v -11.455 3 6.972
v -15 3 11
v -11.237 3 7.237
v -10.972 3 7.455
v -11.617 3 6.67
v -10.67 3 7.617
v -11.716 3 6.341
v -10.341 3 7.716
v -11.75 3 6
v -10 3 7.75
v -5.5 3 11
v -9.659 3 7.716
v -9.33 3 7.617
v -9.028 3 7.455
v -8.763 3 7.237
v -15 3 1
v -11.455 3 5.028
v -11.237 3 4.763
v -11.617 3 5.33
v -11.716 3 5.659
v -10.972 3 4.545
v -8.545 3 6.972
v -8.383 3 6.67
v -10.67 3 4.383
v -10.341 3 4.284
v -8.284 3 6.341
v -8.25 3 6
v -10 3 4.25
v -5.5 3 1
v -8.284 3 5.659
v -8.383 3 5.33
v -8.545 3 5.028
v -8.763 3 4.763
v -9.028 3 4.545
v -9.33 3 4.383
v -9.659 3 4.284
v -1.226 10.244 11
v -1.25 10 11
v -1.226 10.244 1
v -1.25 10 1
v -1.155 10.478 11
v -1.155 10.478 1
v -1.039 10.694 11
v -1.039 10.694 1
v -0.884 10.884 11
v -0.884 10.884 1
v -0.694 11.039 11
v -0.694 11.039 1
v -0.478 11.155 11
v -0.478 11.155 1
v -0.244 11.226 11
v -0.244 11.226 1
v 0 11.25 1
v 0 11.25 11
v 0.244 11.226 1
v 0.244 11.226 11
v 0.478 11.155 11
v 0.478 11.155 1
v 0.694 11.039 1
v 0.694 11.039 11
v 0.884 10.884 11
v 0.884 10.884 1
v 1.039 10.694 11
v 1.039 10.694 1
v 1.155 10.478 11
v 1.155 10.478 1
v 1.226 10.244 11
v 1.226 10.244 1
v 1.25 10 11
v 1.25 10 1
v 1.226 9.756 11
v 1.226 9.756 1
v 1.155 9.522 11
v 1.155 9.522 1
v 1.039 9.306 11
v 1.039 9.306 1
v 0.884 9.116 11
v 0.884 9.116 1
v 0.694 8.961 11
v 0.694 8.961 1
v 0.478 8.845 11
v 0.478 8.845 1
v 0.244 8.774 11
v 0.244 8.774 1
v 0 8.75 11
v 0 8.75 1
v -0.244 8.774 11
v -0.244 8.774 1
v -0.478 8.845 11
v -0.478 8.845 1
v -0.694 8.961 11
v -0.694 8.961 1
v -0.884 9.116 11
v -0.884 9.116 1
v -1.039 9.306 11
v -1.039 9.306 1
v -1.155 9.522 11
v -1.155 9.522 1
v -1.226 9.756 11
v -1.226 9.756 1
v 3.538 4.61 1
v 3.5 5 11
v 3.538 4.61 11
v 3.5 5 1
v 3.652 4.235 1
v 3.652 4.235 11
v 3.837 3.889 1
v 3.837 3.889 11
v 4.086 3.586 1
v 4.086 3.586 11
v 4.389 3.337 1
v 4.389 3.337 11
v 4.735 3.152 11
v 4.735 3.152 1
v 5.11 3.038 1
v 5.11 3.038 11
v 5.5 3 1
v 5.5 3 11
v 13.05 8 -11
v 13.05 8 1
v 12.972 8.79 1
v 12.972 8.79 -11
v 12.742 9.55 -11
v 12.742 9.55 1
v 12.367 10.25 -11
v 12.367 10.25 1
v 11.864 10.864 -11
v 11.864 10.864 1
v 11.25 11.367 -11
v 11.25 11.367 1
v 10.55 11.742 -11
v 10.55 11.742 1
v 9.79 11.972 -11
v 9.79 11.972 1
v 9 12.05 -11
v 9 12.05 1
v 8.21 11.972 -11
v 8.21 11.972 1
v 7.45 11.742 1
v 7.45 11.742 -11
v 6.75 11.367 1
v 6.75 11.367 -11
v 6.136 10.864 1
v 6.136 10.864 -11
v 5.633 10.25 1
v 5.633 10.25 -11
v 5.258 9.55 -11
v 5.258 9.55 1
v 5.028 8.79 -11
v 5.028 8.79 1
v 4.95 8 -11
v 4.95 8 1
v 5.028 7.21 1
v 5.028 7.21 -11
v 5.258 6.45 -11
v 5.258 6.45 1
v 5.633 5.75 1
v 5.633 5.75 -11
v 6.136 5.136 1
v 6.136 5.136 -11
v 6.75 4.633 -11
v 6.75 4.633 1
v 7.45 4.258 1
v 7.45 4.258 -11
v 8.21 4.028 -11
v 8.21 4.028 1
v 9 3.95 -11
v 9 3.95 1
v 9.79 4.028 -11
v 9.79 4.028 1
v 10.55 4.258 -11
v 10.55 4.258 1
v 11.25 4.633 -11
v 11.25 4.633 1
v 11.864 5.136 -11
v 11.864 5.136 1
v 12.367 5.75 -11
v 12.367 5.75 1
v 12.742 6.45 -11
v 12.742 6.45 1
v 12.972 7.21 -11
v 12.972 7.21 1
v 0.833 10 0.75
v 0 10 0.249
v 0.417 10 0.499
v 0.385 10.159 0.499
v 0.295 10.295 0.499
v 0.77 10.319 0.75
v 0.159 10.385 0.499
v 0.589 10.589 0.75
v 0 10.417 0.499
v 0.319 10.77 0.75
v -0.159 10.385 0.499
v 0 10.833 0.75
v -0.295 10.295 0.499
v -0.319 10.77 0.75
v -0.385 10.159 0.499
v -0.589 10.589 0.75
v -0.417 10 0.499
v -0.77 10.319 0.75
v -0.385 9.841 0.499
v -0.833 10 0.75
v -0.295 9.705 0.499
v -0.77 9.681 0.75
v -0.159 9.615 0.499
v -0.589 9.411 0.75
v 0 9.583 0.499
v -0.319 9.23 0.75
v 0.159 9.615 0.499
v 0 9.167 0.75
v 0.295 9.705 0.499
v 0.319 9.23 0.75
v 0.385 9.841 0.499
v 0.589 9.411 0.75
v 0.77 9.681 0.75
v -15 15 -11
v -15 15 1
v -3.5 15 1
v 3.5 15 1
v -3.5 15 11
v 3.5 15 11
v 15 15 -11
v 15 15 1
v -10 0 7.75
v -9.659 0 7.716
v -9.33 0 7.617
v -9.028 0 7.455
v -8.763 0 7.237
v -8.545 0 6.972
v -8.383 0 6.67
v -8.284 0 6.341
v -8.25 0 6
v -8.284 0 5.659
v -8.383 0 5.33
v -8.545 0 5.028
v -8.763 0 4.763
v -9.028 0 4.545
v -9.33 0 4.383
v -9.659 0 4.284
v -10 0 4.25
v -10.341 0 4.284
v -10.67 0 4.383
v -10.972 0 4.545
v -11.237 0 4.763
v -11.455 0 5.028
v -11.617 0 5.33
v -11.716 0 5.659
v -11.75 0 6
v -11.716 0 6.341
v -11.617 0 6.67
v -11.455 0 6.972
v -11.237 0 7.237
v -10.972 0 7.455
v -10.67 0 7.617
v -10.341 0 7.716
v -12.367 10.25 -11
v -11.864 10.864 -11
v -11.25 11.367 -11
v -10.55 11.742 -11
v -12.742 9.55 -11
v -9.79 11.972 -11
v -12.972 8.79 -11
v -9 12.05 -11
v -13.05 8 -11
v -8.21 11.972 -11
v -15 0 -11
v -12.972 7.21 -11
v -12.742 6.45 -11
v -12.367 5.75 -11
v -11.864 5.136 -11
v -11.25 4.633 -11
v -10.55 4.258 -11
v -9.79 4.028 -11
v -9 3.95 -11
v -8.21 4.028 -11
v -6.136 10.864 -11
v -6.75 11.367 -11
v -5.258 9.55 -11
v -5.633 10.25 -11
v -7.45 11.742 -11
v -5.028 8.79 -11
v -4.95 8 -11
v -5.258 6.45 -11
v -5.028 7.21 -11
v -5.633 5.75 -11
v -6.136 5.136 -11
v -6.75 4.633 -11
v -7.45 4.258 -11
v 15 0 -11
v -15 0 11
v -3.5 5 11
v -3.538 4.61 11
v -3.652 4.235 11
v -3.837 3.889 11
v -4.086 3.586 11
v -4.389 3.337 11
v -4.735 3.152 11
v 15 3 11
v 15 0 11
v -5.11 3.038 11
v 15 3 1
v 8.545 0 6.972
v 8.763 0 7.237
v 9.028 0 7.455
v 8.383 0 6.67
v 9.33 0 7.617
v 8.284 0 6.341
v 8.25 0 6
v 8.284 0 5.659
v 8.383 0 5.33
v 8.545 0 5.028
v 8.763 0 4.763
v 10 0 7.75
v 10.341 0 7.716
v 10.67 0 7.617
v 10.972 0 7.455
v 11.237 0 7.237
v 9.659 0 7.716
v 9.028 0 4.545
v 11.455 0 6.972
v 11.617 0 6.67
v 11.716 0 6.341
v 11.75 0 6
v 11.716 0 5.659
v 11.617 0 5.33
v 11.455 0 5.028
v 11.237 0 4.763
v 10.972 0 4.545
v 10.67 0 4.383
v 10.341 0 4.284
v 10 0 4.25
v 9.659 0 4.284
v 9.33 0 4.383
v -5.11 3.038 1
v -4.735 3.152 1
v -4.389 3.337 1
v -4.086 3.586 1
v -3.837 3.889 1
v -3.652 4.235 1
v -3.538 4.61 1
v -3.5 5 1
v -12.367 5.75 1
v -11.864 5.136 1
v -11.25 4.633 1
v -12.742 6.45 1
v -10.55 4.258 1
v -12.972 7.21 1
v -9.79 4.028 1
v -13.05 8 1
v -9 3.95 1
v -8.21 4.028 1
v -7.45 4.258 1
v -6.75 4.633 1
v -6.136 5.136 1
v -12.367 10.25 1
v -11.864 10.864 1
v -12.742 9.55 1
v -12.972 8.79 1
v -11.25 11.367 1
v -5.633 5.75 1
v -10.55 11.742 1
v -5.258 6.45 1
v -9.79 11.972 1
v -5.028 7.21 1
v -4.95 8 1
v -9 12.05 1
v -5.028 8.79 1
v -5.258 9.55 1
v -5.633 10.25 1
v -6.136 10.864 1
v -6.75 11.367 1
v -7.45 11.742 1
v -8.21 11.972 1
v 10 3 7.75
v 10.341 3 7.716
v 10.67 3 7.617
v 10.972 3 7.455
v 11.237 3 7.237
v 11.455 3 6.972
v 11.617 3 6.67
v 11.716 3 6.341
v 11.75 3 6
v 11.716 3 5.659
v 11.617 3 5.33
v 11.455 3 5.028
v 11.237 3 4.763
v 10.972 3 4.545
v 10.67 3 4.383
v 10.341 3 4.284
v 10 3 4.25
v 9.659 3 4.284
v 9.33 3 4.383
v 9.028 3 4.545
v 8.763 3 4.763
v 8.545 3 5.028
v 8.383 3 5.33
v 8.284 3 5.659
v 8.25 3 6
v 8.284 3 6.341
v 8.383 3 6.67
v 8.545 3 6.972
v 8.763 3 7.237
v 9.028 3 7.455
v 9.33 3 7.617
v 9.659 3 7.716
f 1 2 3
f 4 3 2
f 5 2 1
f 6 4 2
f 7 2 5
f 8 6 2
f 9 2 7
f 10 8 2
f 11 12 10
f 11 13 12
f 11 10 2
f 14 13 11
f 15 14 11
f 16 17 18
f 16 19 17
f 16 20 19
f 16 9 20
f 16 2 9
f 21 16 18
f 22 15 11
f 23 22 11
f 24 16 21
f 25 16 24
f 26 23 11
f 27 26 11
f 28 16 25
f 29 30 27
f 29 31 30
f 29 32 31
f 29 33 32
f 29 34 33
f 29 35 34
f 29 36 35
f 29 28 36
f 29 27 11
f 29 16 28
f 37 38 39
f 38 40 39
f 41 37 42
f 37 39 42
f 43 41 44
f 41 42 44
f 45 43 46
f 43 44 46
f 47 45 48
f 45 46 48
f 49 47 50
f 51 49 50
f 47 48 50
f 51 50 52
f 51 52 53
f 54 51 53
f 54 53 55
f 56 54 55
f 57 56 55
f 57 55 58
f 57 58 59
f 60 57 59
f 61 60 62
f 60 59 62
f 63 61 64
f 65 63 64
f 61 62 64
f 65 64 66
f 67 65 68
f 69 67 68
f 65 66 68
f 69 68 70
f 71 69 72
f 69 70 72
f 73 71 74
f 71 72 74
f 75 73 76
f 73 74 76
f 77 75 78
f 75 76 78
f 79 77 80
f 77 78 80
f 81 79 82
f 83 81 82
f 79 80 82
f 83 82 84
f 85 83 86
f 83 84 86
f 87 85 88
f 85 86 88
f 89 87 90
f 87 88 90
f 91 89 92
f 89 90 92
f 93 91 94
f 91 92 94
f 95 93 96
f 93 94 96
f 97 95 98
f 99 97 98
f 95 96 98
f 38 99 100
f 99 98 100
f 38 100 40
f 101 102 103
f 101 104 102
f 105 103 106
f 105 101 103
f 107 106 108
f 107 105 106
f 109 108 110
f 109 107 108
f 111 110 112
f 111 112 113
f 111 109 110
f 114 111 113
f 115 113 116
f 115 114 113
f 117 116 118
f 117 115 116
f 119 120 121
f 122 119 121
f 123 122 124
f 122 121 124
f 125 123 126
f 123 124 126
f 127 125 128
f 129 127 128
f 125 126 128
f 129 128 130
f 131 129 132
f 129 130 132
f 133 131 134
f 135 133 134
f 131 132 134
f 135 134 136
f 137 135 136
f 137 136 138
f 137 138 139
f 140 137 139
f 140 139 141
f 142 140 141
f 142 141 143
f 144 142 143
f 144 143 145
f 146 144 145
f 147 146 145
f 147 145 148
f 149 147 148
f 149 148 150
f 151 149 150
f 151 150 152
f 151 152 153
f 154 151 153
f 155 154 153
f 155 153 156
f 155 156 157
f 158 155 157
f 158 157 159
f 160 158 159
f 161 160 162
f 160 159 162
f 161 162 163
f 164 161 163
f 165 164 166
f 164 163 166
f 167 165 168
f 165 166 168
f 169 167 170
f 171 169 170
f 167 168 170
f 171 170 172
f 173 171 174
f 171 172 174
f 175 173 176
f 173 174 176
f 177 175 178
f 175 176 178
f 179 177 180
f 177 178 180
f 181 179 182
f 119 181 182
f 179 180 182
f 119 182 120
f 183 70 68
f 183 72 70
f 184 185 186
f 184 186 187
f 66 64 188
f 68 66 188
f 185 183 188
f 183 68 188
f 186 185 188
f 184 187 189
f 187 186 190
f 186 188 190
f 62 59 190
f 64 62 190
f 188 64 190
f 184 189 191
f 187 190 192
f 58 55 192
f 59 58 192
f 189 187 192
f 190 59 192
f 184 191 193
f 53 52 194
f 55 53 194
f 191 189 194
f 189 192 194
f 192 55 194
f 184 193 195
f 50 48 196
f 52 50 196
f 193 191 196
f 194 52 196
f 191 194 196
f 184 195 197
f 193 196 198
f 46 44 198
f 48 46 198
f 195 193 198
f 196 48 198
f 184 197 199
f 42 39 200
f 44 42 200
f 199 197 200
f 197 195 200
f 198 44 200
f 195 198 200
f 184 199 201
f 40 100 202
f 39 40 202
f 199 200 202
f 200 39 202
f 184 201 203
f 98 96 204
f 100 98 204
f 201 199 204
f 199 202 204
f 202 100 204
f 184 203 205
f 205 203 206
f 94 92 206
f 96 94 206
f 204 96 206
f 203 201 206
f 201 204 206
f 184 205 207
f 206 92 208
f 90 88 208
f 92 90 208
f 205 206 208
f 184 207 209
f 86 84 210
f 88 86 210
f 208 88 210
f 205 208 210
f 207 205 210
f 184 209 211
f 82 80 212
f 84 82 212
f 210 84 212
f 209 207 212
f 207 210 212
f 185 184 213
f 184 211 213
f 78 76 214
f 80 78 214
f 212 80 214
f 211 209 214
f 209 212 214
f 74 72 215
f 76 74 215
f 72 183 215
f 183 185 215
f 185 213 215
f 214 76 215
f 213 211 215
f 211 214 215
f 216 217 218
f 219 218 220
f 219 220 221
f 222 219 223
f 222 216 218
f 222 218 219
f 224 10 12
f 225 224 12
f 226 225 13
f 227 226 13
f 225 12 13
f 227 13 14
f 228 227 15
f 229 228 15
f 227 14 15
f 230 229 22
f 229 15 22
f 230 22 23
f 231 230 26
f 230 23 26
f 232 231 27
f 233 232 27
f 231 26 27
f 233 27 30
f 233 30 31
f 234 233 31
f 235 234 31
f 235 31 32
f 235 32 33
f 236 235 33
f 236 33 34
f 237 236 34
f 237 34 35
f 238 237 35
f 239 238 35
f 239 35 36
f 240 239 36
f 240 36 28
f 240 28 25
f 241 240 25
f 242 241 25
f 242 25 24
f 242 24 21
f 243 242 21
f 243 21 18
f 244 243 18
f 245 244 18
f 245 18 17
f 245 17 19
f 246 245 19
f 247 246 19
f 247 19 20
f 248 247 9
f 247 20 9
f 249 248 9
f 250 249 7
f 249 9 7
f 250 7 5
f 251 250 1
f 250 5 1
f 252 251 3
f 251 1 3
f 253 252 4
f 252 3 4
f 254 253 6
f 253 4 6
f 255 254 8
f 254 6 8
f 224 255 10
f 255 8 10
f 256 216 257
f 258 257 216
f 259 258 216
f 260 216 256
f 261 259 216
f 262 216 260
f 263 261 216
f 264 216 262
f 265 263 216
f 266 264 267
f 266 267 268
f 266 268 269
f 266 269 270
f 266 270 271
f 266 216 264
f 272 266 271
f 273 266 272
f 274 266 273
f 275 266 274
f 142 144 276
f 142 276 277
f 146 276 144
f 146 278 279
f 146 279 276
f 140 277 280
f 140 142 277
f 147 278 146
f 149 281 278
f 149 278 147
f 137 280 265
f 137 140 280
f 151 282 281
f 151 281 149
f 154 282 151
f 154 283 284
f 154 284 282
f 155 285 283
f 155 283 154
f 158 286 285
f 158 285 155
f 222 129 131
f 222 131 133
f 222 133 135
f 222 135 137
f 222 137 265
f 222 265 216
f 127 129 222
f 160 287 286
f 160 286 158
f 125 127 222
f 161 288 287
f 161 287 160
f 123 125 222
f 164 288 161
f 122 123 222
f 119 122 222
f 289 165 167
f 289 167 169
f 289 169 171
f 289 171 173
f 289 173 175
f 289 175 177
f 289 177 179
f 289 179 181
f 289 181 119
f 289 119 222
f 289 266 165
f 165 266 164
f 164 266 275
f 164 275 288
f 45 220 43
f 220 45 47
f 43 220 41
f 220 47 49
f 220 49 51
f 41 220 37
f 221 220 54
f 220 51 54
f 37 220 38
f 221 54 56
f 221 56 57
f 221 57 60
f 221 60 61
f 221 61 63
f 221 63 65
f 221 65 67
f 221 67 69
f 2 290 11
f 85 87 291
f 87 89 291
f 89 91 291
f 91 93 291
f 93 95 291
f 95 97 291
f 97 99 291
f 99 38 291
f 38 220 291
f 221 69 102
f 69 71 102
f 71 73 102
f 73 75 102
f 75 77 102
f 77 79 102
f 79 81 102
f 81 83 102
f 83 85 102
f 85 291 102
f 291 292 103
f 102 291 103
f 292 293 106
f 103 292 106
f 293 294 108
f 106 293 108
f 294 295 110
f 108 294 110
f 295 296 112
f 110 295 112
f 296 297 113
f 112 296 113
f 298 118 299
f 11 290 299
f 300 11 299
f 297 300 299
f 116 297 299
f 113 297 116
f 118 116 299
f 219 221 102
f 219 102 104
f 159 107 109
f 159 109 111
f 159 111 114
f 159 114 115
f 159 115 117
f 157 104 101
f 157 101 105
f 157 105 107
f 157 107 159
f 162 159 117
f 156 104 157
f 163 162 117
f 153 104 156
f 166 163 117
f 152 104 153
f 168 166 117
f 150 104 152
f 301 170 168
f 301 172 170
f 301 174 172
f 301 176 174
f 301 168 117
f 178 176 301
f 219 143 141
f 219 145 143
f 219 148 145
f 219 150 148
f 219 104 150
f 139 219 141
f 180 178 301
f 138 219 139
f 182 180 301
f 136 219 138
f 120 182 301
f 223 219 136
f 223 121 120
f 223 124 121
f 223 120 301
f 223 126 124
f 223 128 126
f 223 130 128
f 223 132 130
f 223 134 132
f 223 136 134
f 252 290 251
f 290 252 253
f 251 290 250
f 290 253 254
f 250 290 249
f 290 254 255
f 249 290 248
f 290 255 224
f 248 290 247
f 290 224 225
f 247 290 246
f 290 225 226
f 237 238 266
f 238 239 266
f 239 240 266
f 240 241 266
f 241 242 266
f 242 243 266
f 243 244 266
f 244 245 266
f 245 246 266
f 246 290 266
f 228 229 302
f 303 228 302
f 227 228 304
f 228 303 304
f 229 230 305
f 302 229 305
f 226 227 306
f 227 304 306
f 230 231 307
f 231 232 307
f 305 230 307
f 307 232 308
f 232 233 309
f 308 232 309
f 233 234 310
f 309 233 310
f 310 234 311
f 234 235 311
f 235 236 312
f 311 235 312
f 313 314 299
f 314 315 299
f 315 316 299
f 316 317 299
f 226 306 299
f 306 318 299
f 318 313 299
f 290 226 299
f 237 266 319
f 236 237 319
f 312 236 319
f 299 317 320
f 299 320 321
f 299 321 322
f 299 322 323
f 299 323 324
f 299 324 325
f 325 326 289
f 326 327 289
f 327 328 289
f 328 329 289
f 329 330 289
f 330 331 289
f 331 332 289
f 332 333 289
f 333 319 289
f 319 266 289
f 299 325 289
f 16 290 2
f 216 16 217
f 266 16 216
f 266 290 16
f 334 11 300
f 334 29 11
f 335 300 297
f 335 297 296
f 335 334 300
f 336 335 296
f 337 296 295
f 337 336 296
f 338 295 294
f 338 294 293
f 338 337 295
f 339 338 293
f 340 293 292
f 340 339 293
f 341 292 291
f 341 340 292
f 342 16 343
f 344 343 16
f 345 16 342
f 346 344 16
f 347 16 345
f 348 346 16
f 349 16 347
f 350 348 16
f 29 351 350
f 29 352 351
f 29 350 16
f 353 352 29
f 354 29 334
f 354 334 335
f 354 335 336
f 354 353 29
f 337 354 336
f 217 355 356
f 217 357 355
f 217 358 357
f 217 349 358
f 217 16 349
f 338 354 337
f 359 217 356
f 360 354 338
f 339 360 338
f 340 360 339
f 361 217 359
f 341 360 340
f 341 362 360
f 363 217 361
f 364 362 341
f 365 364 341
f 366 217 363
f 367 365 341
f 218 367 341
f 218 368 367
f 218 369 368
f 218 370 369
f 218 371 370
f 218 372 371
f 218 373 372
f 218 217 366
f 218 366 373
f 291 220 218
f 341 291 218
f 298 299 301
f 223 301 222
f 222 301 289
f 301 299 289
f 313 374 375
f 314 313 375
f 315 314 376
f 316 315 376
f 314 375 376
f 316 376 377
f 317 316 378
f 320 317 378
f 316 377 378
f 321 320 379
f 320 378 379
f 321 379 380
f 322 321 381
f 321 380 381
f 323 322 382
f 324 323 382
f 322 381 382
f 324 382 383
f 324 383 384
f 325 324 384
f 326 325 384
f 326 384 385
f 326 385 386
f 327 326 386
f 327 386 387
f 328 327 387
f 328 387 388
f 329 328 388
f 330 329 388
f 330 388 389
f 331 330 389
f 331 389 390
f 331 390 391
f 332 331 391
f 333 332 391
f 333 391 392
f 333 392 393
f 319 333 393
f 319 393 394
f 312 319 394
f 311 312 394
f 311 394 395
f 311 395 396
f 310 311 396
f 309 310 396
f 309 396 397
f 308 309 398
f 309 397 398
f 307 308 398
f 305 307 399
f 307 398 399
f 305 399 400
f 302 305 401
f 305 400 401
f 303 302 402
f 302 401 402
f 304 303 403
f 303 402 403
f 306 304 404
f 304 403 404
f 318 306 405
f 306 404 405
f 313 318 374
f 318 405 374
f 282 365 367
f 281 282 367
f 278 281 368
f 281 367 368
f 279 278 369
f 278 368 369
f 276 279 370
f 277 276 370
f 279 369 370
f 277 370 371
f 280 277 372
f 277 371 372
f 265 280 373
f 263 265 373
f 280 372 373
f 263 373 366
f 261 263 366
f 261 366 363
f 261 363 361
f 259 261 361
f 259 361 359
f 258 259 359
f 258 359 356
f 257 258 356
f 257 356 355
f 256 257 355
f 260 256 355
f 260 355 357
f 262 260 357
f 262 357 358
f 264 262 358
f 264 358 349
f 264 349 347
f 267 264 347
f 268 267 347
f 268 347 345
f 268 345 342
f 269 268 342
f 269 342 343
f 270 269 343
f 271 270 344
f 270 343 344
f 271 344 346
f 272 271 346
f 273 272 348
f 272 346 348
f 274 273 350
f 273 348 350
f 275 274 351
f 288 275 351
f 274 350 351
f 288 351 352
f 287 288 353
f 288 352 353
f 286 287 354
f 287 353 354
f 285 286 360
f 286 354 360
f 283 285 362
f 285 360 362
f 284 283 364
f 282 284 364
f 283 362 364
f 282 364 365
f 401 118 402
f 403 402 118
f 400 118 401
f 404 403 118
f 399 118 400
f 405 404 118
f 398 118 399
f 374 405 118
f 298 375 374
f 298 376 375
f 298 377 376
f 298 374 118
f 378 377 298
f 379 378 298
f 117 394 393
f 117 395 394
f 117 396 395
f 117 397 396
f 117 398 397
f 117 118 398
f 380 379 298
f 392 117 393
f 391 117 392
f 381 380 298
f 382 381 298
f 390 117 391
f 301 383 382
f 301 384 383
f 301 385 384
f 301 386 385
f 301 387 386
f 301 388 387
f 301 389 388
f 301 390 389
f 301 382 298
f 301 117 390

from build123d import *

# Parameters (mm, degrees)
ESQUISSE1_W             = 30
ESQUISSE1_H             = 22
BOSS_EXTRU_1_DEPTH      = 15
ESQUISSE2_W             = 11.5
ESQUISSE2_H             = 10
ENL_V_MAT_EXTRU_2_DEPTH = 12
CONG_1_R                = 2
ESQUISSE3_R             = 4.05
ENL_V_MAT_EXTRU_3_DEPTH = 13
ENL_V_MAT_EXTRU_4_REACH = 5
ESQUISSE4_R             = 1.75
TROU_TARAUD_M31_D       = 2.5
TROU_TARAUD_M31_DEPTH   = 10
TROU_TARAUD_M31_TIP     = 0.751075774


with BuildPart() as part:
    # Esquisse1 → Boss.-Extru.1 (new body)
    with BuildSketch(Plane(origin=(0, 0, 0), x_dir=(1, 0, 0), z_dir=(0, 1, 0))):
        Rectangle(ESQUISSE1_W, ESQUISSE1_H)
    extrude(amount=BOSS_EXTRU_1_DEPTH)

    # Esquisse2 → Enlèv. mat.-Extru.2 (cut)
    with BuildSketch(Plane(origin=(0, 15, 0), x_dir=(1, 0, 0), z_dir=(0, 1, 0))):
        with Locations((-9.25, -6)):
            Rectangle(ESQUISSE2_W, ESQUISSE2_H)
        with Locations((9.25, -6)):
            Rectangle(ESQUISSE2_W, ESQUISSE2_H)
    extrude(amount=-ENL_V_MAT_EXTRU_2_DEPTH, mode=Mode.SUBTRACT)

    # Congé1
    cong_1_edges = [part.edges().sort_by_distance(p)[0] for p in [
        (-3.5, 3, 6),
        (3.5, 3, 6),
    ]]
    fillet(cong_1_edges, radius=CONG_1_R)

    # Esquisse3 → Enlèv. mat.-Extru.3 (cut, through all)
    with BuildSketch(Plane.XY.offset(1)):
        with Locations((-9, 8)):
            Circle(ESQUISSE3_R)
        with Locations((9, 8)):
            Circle(ESQUISSE3_R)
    extrude(amount=-ENL_V_MAT_EXTRU_3_DEPTH, mode=Mode.SUBTRACT)

    # Esquisse4 → Enlèv. mat.-Extru.4 (cut, up to next)
    with BuildSketch(Plane(origin=(0, 3, 0), x_dir=(1, 0, 0), z_dir=(0, 1, 0)), mode=Mode.PRIVATE) as enl_v_mat_extru_4_sk1:
        with Locations(Location((-10, -6, 0), (0, 0, 270))):  # turned: the seam where the file's is
            Circle(ESQUISSE4_R)
    enl_v_mat_extru_4_tool1 = extrude(enl_v_mat_extru_4_sk1.sketch, amount=-ENL_V_MAT_EXTRU_4_REACH, mode=Mode.PRIVATE) & part.part
    add(enl_v_mat_extru_4_tool1.solids().sort_by_distance((-10, 3, 6))[0], mode=Mode.SUBTRACT)
    # Esquisse4 → Enlèv. mat.-Extru.4 (cut, up to next)
    with BuildSketch(Plane(origin=(0, 3, 0), x_dir=(1, 0, 0), z_dir=(0, 1, 0)), mode=Mode.PRIVATE) as enl_v_mat_extru_4_sk2:
        with Locations(Location((10, -6, 0), (0, 0, 270))):  # turned: the seam where the file's is
            Circle(ESQUISSE4_R)
    enl_v_mat_extru_4_tool2 = extrude(enl_v_mat_extru_4_sk2.sketch, amount=-ENL_V_MAT_EXTRU_4_REACH, mode=Mode.PRIVATE) & part.part
    add(enl_v_mat_extru_4_tool2.solids().sort_by_distance((10, 3, 6))[0], mode=Mode.SUBTRACT)

    # Trou taraudé M31
    with Locations(Plane.XY.offset(11)):
        with Locations((0, 10)):
            Hole(TROU_TARAUD_M31_D / 2, depth=TROU_TARAUD_M31_DEPTH)
            with Locations((0, 0, -(TROU_TARAUD_M31_DEPTH + TROU_TARAUD_M31_TIP / 2))):  # 118° drill point
                Cone(0, TROU_TARAUD_M31_D / 2, TROU_TARAUD_M31_TIP, mode=Mode.SUBTRACT)


solid = part.part
